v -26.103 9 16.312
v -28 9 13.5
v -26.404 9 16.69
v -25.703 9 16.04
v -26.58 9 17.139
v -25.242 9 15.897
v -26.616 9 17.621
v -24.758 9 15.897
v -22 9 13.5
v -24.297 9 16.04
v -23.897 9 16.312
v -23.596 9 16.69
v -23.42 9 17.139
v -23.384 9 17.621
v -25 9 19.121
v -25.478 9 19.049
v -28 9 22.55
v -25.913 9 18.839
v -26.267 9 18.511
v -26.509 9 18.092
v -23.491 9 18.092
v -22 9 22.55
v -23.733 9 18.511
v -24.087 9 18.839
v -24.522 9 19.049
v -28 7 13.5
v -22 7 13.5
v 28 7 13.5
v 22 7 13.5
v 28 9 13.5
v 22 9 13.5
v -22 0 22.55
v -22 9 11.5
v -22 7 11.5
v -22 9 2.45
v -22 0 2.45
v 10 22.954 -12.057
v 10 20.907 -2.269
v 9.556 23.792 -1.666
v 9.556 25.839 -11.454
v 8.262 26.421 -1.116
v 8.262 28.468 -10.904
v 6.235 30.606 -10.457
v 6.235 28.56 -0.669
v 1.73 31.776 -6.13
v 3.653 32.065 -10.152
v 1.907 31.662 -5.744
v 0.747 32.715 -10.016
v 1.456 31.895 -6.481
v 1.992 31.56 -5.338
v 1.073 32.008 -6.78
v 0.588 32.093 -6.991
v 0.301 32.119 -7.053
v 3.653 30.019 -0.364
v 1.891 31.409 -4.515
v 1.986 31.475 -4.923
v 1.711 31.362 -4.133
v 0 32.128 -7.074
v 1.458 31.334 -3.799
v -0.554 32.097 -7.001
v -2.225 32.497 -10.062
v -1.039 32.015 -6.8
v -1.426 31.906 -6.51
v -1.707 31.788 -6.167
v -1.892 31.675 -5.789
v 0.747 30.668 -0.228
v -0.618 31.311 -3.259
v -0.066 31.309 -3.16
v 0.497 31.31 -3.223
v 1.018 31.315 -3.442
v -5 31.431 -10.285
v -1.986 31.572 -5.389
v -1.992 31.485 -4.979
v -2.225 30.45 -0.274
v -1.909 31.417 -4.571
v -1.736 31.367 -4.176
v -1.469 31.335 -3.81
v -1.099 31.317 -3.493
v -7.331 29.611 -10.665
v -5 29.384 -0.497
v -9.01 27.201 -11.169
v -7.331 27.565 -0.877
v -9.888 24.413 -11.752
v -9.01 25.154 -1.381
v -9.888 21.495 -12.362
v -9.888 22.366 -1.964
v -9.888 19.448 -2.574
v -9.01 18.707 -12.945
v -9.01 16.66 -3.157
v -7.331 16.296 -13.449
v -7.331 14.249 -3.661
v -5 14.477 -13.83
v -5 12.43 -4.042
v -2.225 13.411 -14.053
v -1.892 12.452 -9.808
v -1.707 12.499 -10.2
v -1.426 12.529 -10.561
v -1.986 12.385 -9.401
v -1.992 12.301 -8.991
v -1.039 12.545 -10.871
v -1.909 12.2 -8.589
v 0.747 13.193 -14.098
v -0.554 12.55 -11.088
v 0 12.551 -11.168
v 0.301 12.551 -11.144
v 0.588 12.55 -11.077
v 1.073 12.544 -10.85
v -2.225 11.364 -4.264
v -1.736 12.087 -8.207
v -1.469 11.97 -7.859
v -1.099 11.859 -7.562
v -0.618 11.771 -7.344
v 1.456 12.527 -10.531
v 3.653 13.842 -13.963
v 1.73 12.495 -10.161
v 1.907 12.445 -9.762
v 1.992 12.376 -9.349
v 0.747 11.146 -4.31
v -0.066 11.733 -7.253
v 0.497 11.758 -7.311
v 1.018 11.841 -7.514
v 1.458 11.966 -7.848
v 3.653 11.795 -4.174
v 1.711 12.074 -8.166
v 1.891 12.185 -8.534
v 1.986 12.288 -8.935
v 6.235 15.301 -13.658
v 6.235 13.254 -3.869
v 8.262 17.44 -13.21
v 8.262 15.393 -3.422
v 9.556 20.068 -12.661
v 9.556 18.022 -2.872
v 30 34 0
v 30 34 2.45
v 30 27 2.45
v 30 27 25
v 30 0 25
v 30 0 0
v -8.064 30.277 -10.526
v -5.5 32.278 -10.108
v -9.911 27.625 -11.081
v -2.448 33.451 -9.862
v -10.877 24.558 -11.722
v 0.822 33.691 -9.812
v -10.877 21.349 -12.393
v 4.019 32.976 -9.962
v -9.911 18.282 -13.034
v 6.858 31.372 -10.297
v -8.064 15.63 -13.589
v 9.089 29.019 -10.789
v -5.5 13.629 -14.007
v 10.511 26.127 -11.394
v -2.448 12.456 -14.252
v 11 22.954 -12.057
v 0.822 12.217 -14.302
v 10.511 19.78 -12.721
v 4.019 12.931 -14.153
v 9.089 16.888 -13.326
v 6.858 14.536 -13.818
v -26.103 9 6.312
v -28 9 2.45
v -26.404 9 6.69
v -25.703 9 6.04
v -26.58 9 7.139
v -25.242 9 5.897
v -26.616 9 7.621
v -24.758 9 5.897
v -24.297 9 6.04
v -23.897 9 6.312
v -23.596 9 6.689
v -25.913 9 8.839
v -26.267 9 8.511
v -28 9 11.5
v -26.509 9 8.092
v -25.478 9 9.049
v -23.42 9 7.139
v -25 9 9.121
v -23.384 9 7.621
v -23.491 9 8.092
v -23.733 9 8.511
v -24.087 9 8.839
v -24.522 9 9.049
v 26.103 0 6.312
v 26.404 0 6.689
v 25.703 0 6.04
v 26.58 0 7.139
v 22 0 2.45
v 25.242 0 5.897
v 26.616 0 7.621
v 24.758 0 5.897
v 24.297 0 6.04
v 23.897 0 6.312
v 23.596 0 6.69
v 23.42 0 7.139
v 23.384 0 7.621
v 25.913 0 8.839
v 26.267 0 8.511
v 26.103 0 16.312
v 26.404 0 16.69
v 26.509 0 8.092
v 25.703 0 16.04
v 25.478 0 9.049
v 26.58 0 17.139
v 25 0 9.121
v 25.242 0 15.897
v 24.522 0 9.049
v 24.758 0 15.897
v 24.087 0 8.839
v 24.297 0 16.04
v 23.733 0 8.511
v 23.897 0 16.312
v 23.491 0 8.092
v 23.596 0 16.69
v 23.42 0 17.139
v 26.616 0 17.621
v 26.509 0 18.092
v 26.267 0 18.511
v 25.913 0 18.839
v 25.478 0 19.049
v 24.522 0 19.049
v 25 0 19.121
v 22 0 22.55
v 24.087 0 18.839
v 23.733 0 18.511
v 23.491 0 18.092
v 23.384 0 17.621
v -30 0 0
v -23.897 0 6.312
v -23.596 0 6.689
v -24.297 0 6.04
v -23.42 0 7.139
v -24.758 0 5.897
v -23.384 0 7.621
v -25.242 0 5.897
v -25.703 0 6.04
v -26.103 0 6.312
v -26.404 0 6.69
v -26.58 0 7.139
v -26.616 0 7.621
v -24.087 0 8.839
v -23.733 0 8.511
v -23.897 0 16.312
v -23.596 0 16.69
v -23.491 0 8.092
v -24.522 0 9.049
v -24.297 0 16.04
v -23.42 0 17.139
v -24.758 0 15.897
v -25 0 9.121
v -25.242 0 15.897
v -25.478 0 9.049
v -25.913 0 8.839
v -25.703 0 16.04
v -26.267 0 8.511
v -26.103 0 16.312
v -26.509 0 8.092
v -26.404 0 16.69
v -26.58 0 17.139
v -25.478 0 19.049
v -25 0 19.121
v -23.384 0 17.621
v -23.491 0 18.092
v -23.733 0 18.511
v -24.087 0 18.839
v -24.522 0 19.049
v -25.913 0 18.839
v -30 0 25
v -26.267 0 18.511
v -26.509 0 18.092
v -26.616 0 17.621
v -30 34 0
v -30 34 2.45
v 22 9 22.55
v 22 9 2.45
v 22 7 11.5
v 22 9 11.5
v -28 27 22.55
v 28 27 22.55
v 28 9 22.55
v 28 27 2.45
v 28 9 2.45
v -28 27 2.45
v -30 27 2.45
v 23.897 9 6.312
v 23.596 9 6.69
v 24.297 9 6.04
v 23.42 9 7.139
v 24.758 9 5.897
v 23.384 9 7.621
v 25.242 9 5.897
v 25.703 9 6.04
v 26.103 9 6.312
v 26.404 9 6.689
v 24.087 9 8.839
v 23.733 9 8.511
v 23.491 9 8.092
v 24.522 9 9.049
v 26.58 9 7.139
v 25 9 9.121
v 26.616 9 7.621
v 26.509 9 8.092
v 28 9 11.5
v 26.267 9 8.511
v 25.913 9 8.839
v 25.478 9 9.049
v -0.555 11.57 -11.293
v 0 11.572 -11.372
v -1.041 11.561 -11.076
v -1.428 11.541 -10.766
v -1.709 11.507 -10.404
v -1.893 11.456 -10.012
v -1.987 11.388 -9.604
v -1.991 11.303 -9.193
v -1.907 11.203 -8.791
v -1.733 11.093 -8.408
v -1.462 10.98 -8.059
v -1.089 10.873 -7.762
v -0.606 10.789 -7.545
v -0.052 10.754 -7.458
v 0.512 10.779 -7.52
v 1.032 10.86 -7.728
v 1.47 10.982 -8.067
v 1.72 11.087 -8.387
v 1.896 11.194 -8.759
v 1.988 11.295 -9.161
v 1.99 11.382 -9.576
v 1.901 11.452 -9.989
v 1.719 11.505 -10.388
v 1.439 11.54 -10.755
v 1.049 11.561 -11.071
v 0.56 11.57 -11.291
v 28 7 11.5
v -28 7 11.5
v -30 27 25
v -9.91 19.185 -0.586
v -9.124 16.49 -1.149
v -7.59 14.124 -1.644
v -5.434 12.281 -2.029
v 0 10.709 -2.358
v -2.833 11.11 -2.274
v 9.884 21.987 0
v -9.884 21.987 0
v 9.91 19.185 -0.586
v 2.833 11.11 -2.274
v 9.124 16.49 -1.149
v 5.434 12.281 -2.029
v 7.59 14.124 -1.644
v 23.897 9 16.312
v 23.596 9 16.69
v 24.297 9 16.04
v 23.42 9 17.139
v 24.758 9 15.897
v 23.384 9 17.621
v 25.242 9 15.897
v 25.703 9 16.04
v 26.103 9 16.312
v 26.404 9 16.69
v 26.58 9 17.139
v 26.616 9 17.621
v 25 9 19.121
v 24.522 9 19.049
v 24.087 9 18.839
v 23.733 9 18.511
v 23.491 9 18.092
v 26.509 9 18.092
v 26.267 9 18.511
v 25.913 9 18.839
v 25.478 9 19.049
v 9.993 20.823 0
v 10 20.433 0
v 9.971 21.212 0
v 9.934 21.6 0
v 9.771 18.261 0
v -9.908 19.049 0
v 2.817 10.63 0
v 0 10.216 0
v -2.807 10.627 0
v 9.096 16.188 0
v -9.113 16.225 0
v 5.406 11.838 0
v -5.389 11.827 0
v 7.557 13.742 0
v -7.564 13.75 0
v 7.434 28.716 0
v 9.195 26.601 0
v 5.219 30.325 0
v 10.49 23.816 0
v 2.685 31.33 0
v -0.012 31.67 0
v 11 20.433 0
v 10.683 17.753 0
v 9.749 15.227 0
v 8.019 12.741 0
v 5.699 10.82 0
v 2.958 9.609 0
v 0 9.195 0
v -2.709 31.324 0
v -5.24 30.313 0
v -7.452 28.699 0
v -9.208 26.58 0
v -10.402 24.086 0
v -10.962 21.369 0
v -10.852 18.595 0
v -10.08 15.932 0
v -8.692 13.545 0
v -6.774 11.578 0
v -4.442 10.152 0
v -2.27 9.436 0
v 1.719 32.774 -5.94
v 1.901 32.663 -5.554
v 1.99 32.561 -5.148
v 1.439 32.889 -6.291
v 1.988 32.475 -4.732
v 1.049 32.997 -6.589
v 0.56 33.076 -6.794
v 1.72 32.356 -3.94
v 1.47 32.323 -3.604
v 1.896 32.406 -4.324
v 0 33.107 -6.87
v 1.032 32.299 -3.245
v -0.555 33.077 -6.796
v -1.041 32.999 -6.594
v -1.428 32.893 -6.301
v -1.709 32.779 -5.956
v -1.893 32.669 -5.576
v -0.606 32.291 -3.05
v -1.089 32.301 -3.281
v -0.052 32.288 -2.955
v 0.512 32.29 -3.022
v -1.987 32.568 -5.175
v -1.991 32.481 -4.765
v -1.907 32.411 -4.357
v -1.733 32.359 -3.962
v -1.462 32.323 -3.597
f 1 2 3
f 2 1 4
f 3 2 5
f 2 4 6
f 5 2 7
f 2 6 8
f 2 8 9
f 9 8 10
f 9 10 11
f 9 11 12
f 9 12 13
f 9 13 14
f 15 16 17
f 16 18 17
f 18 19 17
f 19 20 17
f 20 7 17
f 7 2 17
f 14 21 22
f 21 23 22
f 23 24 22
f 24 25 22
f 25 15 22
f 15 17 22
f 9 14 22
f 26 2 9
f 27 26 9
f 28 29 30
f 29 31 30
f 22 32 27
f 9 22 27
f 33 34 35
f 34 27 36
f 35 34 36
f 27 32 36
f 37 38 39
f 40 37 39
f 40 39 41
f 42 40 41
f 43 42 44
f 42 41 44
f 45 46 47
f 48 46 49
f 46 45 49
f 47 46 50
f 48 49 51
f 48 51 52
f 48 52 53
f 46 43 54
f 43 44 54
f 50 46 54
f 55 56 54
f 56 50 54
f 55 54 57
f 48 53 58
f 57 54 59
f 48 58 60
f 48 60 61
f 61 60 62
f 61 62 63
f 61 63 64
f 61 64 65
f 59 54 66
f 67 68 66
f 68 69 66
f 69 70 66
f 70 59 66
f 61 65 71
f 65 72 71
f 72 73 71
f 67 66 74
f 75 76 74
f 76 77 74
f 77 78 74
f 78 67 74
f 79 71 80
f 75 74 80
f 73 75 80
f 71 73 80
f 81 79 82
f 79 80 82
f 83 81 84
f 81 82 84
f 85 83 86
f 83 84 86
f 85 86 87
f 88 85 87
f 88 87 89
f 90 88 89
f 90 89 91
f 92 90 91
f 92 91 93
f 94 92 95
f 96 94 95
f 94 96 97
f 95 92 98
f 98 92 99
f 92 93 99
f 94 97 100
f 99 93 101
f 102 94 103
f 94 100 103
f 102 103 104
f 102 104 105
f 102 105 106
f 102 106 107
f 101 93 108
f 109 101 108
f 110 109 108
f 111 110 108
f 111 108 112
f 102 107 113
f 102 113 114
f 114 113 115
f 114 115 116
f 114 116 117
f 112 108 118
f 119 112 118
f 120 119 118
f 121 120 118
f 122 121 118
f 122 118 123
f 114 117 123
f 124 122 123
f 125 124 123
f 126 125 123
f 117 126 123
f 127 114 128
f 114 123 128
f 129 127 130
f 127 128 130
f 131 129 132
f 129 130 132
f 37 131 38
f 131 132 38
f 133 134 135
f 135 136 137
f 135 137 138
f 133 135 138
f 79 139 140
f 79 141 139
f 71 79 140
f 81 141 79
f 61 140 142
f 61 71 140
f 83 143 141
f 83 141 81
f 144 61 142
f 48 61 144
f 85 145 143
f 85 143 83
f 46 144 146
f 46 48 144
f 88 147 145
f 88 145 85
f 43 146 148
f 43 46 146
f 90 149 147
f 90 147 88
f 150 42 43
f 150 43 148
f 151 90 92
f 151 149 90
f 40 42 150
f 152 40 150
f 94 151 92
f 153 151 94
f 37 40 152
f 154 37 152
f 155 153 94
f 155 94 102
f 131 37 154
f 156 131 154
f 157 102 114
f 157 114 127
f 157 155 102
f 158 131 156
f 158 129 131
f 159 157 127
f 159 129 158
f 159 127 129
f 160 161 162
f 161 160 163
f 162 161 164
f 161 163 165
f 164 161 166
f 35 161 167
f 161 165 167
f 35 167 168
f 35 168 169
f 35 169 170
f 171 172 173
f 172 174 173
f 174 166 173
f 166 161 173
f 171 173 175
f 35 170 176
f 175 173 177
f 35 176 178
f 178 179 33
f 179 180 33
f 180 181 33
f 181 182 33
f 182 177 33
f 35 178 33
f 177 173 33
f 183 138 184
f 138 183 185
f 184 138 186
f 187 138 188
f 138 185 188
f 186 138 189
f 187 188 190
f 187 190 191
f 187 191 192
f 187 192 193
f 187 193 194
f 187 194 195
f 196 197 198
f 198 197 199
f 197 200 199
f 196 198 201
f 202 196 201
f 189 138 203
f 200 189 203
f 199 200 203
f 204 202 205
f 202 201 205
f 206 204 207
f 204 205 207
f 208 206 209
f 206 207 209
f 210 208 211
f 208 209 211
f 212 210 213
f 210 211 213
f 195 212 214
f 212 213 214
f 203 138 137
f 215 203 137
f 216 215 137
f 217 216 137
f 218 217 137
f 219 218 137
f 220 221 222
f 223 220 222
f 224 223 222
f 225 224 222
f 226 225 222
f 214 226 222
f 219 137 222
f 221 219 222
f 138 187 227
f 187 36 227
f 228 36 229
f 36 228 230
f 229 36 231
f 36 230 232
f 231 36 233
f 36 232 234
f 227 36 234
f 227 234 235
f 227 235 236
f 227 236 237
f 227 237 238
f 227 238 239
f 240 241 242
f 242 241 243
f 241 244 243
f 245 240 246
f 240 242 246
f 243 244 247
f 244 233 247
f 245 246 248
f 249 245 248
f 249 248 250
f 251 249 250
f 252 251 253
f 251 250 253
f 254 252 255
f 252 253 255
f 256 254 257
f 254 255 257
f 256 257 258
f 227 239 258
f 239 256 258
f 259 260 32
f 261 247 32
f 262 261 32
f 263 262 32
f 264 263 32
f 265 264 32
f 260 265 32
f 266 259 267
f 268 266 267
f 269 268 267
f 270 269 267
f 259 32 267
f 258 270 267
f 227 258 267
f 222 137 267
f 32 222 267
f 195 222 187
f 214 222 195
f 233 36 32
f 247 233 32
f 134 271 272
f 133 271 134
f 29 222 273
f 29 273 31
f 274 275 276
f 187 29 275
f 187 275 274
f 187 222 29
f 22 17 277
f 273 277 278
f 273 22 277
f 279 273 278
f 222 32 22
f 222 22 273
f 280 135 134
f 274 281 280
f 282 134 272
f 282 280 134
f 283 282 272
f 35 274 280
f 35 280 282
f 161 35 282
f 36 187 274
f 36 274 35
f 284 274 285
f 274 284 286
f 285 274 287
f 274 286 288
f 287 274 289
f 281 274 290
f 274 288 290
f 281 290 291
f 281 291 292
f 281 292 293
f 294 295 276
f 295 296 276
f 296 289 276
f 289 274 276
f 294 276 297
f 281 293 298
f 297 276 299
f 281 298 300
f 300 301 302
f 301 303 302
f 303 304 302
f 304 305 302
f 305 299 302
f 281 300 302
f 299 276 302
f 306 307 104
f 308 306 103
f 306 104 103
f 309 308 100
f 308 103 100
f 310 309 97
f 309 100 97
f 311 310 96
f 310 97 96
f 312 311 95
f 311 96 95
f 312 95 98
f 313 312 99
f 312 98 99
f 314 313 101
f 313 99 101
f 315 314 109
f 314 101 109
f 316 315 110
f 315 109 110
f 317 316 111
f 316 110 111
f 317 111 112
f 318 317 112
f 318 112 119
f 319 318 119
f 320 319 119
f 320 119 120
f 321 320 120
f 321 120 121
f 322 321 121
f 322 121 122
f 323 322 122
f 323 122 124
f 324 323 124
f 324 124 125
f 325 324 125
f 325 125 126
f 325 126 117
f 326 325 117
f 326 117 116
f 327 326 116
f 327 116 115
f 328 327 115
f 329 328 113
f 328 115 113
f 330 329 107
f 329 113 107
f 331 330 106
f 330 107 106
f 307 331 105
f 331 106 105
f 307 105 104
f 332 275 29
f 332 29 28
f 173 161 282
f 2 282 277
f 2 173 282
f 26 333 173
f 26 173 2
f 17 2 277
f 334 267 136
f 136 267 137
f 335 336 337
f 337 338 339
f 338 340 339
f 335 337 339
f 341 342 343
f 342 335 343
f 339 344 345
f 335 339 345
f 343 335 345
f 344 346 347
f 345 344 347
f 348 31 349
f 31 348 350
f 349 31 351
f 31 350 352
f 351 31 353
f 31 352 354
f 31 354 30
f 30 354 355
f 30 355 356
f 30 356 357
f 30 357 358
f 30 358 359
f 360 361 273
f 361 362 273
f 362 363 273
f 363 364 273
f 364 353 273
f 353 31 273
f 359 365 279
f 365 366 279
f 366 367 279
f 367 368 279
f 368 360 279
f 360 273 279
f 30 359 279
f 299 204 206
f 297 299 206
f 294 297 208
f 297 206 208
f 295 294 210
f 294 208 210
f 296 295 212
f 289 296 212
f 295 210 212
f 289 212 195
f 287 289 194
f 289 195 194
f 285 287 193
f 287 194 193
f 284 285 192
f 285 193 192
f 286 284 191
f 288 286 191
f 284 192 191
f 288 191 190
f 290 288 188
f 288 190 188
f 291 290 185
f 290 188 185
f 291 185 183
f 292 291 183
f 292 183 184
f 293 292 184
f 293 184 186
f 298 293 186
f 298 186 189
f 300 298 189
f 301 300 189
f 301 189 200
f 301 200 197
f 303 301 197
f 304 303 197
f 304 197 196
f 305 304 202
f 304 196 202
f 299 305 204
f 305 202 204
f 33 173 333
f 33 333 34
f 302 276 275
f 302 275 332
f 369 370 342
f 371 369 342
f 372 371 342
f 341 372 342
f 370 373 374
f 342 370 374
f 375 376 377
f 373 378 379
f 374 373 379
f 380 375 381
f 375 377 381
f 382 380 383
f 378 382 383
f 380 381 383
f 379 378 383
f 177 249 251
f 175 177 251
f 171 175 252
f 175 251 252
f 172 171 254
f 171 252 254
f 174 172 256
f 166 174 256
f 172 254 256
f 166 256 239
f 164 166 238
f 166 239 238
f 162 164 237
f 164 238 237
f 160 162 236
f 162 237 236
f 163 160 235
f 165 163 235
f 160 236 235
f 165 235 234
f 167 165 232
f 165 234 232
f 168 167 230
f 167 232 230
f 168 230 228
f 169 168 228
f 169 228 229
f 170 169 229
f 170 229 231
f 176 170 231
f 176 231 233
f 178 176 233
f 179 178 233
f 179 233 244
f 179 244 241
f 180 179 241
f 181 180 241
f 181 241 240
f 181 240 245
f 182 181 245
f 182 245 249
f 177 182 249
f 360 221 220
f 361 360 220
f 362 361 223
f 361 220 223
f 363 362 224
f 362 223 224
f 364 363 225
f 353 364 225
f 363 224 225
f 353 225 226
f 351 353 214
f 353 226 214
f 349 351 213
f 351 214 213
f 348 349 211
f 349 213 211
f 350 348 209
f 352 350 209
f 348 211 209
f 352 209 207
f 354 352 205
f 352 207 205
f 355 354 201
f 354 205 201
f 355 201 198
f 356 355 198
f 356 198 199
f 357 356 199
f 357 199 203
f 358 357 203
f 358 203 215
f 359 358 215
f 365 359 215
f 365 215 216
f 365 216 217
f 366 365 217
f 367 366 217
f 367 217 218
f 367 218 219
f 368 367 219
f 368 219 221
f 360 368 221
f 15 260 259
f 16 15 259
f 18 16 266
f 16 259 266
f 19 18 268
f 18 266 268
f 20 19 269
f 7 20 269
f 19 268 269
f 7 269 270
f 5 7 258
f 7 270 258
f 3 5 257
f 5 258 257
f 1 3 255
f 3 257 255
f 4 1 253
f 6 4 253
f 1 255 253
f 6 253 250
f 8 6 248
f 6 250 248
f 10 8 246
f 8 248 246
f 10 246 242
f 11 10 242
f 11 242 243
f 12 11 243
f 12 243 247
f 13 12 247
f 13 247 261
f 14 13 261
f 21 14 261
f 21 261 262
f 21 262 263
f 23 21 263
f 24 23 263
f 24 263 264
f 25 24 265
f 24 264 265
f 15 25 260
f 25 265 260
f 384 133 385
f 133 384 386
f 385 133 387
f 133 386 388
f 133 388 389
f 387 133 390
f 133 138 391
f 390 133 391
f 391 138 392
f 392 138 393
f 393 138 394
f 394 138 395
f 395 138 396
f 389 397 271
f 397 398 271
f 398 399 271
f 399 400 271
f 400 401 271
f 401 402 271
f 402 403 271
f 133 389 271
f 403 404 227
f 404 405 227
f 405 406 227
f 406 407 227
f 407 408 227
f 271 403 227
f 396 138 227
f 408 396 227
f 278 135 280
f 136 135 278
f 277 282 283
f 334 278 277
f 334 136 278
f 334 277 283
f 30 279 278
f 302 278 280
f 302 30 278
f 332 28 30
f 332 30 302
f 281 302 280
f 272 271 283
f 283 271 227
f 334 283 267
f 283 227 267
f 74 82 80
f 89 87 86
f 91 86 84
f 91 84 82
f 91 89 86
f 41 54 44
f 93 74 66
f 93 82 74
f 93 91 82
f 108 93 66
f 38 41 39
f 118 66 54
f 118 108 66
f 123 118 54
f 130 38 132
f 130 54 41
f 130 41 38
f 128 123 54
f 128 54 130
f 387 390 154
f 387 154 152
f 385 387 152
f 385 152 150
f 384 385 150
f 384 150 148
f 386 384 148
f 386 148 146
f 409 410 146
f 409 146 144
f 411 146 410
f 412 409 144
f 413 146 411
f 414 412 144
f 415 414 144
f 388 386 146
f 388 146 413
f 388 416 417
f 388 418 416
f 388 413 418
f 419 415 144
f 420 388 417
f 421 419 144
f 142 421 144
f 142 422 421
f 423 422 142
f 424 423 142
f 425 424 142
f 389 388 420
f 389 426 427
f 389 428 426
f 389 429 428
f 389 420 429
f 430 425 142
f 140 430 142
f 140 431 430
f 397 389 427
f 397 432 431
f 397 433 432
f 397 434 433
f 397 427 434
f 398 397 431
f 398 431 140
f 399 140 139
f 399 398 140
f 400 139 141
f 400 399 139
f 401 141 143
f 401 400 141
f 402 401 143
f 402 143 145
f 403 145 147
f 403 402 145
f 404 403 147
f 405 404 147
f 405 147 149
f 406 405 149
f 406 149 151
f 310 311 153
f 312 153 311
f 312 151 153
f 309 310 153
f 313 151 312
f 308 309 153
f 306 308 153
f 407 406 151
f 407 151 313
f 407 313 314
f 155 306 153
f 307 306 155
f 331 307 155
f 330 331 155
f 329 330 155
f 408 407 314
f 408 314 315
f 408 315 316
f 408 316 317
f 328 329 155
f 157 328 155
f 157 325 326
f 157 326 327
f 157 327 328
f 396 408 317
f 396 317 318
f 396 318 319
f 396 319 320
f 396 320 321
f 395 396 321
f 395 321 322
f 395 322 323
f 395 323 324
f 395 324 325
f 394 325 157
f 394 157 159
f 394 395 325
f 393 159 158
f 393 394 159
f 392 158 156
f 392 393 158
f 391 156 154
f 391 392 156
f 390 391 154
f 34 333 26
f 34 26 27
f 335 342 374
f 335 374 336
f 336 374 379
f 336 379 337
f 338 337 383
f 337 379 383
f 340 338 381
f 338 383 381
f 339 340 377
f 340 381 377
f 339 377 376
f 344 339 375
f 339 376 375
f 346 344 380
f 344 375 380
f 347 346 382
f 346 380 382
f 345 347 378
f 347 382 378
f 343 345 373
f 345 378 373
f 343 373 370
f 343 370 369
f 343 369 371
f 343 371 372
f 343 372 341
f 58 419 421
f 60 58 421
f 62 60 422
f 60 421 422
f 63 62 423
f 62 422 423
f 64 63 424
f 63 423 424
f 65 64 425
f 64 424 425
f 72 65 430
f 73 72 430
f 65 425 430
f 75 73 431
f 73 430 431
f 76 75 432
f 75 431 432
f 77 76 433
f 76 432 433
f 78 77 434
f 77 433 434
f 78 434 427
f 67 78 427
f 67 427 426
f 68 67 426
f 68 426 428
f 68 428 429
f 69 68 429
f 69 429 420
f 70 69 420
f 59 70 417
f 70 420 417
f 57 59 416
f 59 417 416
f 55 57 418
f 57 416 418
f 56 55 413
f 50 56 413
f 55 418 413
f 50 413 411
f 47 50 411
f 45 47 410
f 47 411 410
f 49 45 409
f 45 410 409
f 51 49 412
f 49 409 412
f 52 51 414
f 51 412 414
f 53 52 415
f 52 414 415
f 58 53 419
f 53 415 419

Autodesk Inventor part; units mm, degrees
ref_plane "YZ Plane" through (0, 0, 0) normal (1, 0, 0) x (0, 1, 0)
sketch "Esquisse1" plane through (0, 0, 0) normal (0, 1, 0) x (-1, 0, 0)
  line L0 (0, 0) -> (30, 0)
  line L1 (30, 0) -> (30, 25)
  line L2 (30, 25) -> (-30, 25)
  line L3 (-30, 25) -> (-30, 0)
  line L4 (-30, 0) -> (0, 0)
  line L5 (0, 0) -> (0, 2.45)
  line L6 (0, 2.45) -> (28, 2.45)
  line L7 (28, 2.45) -> (28, 22.55)
  line L8 (28, 22.55) -> (-28, 22.55)
  line L9 (-28, 22.55) -> (-28, 2.45)
  line L10 (-28, 2.45) -> (0, 2.45)
  dimension "d0" = 30
  dimension "d1" = 25
  dimension "d2" = 60
  dimension "d3" = 30
  dimension "d4" = 2.45
  dimension "d5" = 28
  dimension "d7" = 20.1
  dimension "d8" = 56
extrude "Extrusion1" add sketch "Esquisse1" along normal blind 27
ref_plane "Plan de construction1" through (0, 0, 0) normal (0, 0.2046669, -0.9788317) x (1, 0, 0)
sketch "Esquisse10" plane through (0, 27, 0) normal (0, 1, 0) x (1, 0, 0)
  line L0 (-30, 0) -> (-30, -25) projected
  line L1 (30, -25) -> (30, 0) projected
  line L2 (-30, 0) -> (30, 0)
  line L3 (30, 0) -> (30, -2.45)
  line L4 (30, -2.45) -> (-30, -2.45)
  line L5 (-30, -2.45) -> (-30, 0)
  point P0 (0, 0)
  point P1 (30, 0)
  dimension "d67" = 2.45
extrude "Extrusion8" add sketch "Esquisse10" along normal blind 7
sketch "Esquisse2" plane through (0, 0, 0) normal (0, 0.2046669, -0.9788317) x (1, 0, 0)
  line L0 (0, 0) -> (0, -20)
  circle A0 centre (0, -20) radius 10
  circle A1 centre (0, -20) radius 11
  dimension "d12" = 20
  dimension "d13" = 20
  dimension "d14" = 22
extrude "Extrusion2" add sketch "Esquisse2" along normal blind 16.5
sketch "Esquisse3" plane through (0, 27, 0) normal (0, 1, 0) x (1, 0, 0)
  line L0 (-28, -22.55) -> (-28, -2.45) projected
  line L1 (28, -22.55) -> (-28, -22.55) projected
  line L2 (-28, -2.45) -> (28, -2.45) projected
  line L3 (28, -2.45) -> (28, -22.55) projected
  point P0 (0, 0)
extrude "Extrusion3" cut sketch "Esquisse3" against normal through all
ref_plane "Plan de construction2" through (0, 1.3303, -6.3624) normal (0, 0.2046669, -0.9788317) x (1, 0, 0)
sketch "Esquisse4" plane through (0, 1.3303, -6.3624) normal (0, 0.2046669, -0.9788317) x (1, 0, 0)
  circle A0 centre (0, -20) radius 10 projected
  point P0 (0, 0)
extrude "Extrusion4" add sketch "Esquisse4" against normal blind 2
ref_plane "Plan de construction3" through (30, 0, 0) normal (0, -0.9788317, -0.2046669) x (-1, 0, 0)
sketch "Esquisse5" plane through (30, 0, 0) normal (0, -0.9788317, -0.2046669) x (-1, 0, 0)
  line L0 (41, 16.5) -> (19, 16.5) projected
  line L1 (30, 16.5) -> (30, 11.5)
  point P0 (30, 0)
  dimension "d23" = 5
hole "Perçage1" at (0, 2.3537, -11.2566) direction (0, 0.9788317, 0.2046669) diameter 4 end through all
sketch "Esquisse6" plane through (0, 0, 0) normal (0, -1, 0) x (1, 0, 0)
  line L0 (28, 2.45) -> (28, 22.55) projected
  line L1 (-28, 22.55) -> (-28, 2.45) projected
  line L2 (28, 22.55) -> (22, 22.55)
  line L3 (28, 22.55) -> (-28, 22.55) projected
  line L4 (22, 22.55) -> (22, 2.45)
  line L5 (22, 2.45) -> (28, 2.45)
  line L6 (-28, 22.55) -> (-22, 22.55)
  line L7 (-22, 22.55) -> (-22, 2.45)
  line L8 (-22, 2.45) -> (-28, 2.45)
  point P0 (0, 0)
  dimension "d31" = 6
  dimension "d32" = 6
extrude "Extrusion5" add sketch "Esquisse6" against normal blind 9
sketch "Esquisse7" plane through (0, 9, 0) normal (0, 1, 0) x (1, 0, 0)
  line L0 (-28, -22.55) -> (-28, -2.45) projected
  line L1 (-28, -12.5) -> (-25, -12.5)
  line L2 (-25, -12.5) -> (-25, -17.5)
  line L3 (-25, -12.5) -> (-25, -7.5)
  line L4 (28, -2.45) -> (28, -22.55) projected
  line L5 (28, -22.55) -> (28, -12.5)
  line L6 (28, -12.5) -> (25, -12.5)
  line L7 (25, -12.5) -> (25, -7.5)
  line L8 (22, -22.55) -> (22, -2.45) projected
  line L9 (25, -12.5) -> (25, -17.5)
  point P0 (0, 0)
  dimension "d35" = 3
  dimension "d36" = 5
  dimension "d37" = 5
  dimension "d38" = 3
  dimension "d39" = 5
  dimension "d41" = 5
hole "Perçage2" at (-25, 9, 17.5) at (-25, 9, 7.5) at (25, 9, 17.5) at (25, 9, 7.5) direction (0, -1, 0) diameter 3.242 depth 11.8 tip angle 118 thread size "M4x0.7" class "6H" standard "ISO Metric profile"
sketch "Esquisse8" plane through (0, 9, 0) normal (0, 1, 0) x (1, 0, 0)
  line L0 (-22, -22.55) -> (-22, -2.45) projected
  line L1 (-28, -22.55) -> (-28, -2.45) projected
  line L2 (-28, -12.5) -> (-28, -11.5)
  line L3 (-28, -11.5) -> (-22, -11.5)
  line L4 (-28, -12.5) -> (-28, -13.5)
  line L5 (-28, -13.5) -> (-22, -13.5)
  line L6 (-22, -11.5) -> (-22, -13.5)
  line L7 (22, -2.45) -> (22, -22.55) projected
  line L8 (28, -2.45) -> (28, -22.55) projected
  line L9 (28, -22.55) -> (28, -12.5)
  line L10 (28, -12.5) -> (28, -11.5)
  line L11 (22, -11.5) -> (28, -11.5)
  line L12 (22, -11.5) -> (22, -13.5)
  line L13 (22, -13.5) -> (28, -13.5)
  point P0 (0, 0)
  point P1 (28, -12.5)
  point P2 (28, -13.5)
  dimension "d49" = 1
  dimension "d50" = 1
  dimension "d54" = 10.05
  dimension "d55" = 6
  dimension "d56" = 2
  dimension "d57" = 1
extrude "Extrusion6" cut sketch "Esquisse8" against normal blind 2
sketch "Esquisse11" plane through (0, 34, 0) normal (0, 1, 0) x (1, 0, 0)
  ellipse E0 centre (0, 31.4094) end of major axis (0, 85.1552) minor radius 11 (-8.5426, -2.45) -> (-7.9677, -5.6455) ccw projected
  ellipse E1 centre (0, -4.0933) end of major axis (11, -4.0933) minor radius 2.2513 (-7.9677, -5.6455) -> (7.9677, -5.6455) ccw projected
  ellipse E2 centre (0, 31.4094) end of major axis (0, 85.1552) minor radius 11 (7.9677, -5.6455) -> (8.5426, -2.45) ccw projected
  line L0 (-8.5426, -2.45) -> (8.5426, -2.45) projected
  point P0 (0, 0)
extrude "Extrusion9" cut sketch "Esquisse11" against normal blind 10
properties part number "Attache servomoteur"
